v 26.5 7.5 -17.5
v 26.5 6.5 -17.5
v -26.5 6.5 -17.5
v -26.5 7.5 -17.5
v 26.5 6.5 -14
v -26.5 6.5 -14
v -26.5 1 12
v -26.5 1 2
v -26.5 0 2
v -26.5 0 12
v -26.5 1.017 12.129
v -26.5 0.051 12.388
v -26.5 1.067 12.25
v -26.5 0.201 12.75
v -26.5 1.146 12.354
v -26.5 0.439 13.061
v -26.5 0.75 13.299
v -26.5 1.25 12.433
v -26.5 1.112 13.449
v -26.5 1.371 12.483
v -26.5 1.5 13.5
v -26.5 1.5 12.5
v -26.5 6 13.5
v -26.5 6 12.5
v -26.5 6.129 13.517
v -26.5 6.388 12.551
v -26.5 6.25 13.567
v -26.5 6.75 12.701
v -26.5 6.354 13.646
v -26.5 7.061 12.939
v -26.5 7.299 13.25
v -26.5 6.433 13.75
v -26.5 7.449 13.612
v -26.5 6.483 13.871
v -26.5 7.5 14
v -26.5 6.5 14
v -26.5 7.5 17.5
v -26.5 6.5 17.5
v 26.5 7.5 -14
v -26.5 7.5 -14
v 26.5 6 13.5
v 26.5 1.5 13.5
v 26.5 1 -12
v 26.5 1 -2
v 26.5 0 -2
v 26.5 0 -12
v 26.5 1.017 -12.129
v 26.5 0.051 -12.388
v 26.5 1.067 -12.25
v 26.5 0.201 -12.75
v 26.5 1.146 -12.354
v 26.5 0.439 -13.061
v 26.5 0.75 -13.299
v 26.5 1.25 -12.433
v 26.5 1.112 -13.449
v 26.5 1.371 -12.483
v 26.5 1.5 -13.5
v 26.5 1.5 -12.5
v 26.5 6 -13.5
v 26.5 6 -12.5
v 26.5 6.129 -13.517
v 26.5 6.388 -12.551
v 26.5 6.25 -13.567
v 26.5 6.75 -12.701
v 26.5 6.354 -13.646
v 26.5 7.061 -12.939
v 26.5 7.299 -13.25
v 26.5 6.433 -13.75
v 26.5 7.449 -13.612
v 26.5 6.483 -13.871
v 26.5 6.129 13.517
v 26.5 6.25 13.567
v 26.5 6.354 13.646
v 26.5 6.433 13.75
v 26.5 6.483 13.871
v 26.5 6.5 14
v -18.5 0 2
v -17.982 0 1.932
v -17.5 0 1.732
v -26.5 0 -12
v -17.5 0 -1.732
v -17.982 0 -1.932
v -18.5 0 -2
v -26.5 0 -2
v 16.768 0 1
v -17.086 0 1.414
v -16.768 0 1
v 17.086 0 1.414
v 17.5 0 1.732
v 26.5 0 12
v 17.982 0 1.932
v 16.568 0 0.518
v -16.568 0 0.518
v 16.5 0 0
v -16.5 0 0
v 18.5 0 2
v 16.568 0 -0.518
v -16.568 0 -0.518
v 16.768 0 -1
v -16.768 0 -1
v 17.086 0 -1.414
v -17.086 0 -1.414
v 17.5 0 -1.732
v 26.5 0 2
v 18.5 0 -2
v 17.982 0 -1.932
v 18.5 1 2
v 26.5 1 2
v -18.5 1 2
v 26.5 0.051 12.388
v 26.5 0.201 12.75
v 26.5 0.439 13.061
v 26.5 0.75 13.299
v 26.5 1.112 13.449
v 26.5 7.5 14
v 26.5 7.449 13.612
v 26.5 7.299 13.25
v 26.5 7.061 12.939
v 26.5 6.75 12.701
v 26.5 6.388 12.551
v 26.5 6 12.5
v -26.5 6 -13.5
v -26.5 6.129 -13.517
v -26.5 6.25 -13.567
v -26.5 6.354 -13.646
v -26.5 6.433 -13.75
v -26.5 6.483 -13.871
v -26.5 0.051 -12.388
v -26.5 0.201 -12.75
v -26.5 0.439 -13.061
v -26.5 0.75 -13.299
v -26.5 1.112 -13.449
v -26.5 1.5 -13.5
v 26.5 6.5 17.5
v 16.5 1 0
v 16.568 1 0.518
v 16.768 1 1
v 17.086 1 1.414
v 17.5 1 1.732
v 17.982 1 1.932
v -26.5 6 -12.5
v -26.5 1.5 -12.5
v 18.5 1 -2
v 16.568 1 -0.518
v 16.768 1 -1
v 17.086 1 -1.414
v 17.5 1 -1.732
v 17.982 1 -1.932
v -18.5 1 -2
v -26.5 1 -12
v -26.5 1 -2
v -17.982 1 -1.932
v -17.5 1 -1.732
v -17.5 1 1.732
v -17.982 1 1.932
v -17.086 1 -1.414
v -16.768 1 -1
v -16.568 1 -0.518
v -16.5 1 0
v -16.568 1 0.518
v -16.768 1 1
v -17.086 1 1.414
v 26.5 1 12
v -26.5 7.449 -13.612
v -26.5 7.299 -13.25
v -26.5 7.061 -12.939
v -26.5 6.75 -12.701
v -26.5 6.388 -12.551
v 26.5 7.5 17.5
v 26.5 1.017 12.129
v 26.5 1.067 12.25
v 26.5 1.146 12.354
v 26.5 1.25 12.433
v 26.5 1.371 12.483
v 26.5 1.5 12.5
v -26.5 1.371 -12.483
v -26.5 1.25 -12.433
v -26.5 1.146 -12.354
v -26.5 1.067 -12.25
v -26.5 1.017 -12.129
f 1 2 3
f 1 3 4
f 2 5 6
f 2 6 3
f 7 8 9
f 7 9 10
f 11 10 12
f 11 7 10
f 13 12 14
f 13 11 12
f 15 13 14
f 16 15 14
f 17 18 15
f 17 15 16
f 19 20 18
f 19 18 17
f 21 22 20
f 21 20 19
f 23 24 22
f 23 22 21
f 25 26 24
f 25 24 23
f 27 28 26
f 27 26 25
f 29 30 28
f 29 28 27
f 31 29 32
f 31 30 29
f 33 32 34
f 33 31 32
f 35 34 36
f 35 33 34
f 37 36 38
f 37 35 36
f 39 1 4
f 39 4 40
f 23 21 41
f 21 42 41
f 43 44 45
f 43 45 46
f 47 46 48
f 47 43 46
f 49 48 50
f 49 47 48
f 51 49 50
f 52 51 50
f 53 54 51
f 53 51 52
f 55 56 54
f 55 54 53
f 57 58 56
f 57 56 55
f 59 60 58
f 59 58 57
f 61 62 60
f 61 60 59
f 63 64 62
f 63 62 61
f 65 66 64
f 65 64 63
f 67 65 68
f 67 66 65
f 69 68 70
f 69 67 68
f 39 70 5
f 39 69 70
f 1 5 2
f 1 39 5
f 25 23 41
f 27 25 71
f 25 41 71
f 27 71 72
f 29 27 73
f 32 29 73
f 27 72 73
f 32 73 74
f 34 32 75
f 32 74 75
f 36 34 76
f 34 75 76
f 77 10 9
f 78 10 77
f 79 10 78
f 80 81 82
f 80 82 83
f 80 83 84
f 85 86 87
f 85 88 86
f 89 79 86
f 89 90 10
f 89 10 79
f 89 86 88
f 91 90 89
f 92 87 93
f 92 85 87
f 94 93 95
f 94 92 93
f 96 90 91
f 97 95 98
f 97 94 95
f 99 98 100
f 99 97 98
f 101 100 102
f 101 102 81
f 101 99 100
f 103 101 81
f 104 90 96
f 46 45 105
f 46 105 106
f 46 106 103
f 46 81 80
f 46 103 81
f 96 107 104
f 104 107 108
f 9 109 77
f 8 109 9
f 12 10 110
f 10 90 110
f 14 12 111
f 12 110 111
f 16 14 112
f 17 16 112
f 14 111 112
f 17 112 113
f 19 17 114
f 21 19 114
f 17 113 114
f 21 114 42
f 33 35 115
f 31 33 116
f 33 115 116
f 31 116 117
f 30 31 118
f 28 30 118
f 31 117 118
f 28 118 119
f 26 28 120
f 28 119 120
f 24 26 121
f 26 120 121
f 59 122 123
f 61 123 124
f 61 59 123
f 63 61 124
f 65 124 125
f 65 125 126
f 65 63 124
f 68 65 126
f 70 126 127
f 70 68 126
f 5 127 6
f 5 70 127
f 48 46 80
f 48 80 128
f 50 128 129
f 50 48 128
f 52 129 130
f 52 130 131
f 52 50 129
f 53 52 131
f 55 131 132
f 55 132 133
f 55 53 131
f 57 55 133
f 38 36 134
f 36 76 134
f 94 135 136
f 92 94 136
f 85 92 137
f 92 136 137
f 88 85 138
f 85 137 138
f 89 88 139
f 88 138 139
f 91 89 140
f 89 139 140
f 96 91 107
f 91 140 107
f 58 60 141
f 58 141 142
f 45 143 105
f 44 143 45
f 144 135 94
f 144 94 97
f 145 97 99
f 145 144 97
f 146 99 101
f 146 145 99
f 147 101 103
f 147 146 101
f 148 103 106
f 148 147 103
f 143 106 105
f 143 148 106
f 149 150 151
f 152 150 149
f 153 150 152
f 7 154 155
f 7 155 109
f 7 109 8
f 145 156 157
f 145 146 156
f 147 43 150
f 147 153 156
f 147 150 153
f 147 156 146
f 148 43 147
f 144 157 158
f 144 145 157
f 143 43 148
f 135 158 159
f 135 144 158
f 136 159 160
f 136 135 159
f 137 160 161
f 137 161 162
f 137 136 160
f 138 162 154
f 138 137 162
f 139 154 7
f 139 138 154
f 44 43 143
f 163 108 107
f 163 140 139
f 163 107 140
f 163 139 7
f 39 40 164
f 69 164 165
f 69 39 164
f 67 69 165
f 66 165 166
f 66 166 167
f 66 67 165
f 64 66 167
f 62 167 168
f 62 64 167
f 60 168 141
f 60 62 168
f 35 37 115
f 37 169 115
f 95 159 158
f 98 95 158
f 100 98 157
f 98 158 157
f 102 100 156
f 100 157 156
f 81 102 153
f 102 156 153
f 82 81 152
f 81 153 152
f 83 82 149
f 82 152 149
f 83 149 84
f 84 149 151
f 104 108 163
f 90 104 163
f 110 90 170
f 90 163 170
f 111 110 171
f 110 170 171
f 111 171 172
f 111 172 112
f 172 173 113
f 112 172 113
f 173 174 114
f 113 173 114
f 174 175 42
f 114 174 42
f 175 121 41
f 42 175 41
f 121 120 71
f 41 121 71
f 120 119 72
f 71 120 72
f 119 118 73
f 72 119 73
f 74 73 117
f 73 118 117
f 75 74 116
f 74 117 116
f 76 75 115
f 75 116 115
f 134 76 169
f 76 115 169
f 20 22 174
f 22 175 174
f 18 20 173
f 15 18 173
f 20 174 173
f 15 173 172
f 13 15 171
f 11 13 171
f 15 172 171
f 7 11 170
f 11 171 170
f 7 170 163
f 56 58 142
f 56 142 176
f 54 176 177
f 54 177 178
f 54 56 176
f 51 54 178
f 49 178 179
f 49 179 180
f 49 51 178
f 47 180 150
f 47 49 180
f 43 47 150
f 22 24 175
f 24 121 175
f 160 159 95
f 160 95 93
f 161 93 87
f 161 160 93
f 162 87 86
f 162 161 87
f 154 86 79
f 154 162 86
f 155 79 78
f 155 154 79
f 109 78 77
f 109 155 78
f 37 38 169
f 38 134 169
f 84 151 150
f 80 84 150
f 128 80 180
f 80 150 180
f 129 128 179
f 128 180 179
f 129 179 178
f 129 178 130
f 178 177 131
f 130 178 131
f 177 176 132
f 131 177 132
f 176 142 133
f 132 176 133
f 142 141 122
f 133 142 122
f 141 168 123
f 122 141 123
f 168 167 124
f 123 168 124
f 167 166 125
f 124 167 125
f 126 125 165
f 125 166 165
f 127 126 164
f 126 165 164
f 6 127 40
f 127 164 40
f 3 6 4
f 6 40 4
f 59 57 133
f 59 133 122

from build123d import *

# Parameters (mm, degrees)
BOSS_EXTRUDE1_DEPTH   = 26.5
CUT_EXTRUDE1_DEPTH    = 2
MIRROR17_COPY_1_DEPTH = 26.5
MIRROR17_COPY_2_DEPTH = 2


with BuildPart() as part:
    # Sketch1 → Boss-Extrude1 (new body)
    with BuildSketch(Plane(origin=(0, 0, 0), x_dir=(0, 0, -1), z_dir=(1, 0, 0))):
        with BuildLine():
            Line((0, 0), (-12, 0))
            ThreePointArc((-12, 0), (-13.060660172, 0.439339828), (-13.5, 1.5))
            Line((-13.5, 1.5), (-13.5, 6))
            ThreePointArc((-13.5, 6), (-13.646446609, 6.353553391), (-14, 6.5))
            Line((-14, 6.5), (-17.5, 6.5))
            Line((-17.5, 6.5), (-17.5, 7.5))
            Line((-17.5, 7.5), (-14, 7.5))
            ThreePointArc((-14, 7.5), (-12.939339828, 7.060660172), (-12.5, 6))
            Line((-12.5, 6), (-12.5, 1.5))
            ThreePointArc((-12.5, 1.5), (-12.353553391, 1.146446609), (-12, 1))
            Line((-12, 1), (0, 1))
            Line((0, 1), (0, 0))
        make_face()
    boss_extrude1 = extrude(amount=BOSS_EXTRUDE1_DEPTH)

    # Sketch3 → Cut-Extrude1 (cut, through all)
    with BuildSketch(Plane(origin=(0, 1, 0), x_dir=(1, 0, 0), z_dir=(0, 1, 0))):
        with BuildLine():
            Line((26.5, 0), (16.5, 0))
            ThreePointArc((16.5, 0), (17.085786438, -1.414213562), (18.5, -2))
            Line((18.5, -2), (26.5, -2))
            Line((26.5, -2), (26.5, 0))
        make_face()
    cut_extrude1 = extrude(amount=-CUT_EXTRUDE1_DEPTH, mode=Mode.SUBTRACT)

    # Mirror16: Boss-Extrude1, Cut-Extrude1 across plane
    add(boss_extrude1.mirror(Plane(origin=(0, 0, 0), x_dir=(0, 0, 1), z_dir=(1, 0, 0))))
    add(cut_extrude1.mirror(Plane(origin=(0, 0, 0), x_dir=(0, 0, 1), z_dir=(1, 0, 0))), mode=Mode.SUBTRACT)

    # Mirror17: Boss-Extrude1, Cut-Extrude1 across plane
    add(boss_extrude1.mirror(Plane.XY))
    add(cut_extrude1.mirror(Plane.XY), mode=Mode.SUBTRACT)

    # Mirror17 copy 1 sketch → Mirror17 copy 1 (add)
    with BuildSketch(Plane.ZY):
        with BuildLine():
            Line((0, 0), (-12, 0))
            ThreePointArc((-12, 0), (-13.060660172, 0.439339828), (-13.5, 1.5))
            Line((-13.5, 1.5), (-13.5, 6))
            ThreePointArc((-13.5, 6), (-13.646446609, 6.353553391), (-14, 6.5))
            Line((-14, 6.5), (-17.5, 6.5))
            Line((-17.5, 6.5), (-17.5, 7.5))
            Line((-17.5, 7.5), (-14, 7.5))
            ThreePointArc((-14, 7.5), (-12.939339828, 7.060660172), (-12.5, 6))
            Line((-12.5, 6), (-12.5, 1.5))
            ThreePointArc((-12.5, 1.5), (-12.353553391, 1.146446609), (-12, 1))
            Line((-12, 1), (0, 1))
            Line((0, 1), (0, 0))
        make_face()
    extrude(amount=MIRROR17_COPY_1_DEPTH)

    # Mirror17 copy 2 sketch → Mirror17 copy 2 (cut, through all)
    with BuildSketch(Plane(origin=(0, 1, 0), x_dir=(-1, 0, 0), z_dir=(0, 1, 0))):
        with BuildLine():
            Line((26.5, 0), (16.5, 0))
            ThreePointArc((16.5, 0), (17.085786438, -1.414213562), (18.5, -2))
            Line((18.5, -2), (26.5, -2))
            Line((26.5, -2), (26.5, 0))
        make_face()
    extrude(amount=-MIRROR17_COPY_2_DEPTH, mode=Mode.SUBTRACT)


solid = part.part
